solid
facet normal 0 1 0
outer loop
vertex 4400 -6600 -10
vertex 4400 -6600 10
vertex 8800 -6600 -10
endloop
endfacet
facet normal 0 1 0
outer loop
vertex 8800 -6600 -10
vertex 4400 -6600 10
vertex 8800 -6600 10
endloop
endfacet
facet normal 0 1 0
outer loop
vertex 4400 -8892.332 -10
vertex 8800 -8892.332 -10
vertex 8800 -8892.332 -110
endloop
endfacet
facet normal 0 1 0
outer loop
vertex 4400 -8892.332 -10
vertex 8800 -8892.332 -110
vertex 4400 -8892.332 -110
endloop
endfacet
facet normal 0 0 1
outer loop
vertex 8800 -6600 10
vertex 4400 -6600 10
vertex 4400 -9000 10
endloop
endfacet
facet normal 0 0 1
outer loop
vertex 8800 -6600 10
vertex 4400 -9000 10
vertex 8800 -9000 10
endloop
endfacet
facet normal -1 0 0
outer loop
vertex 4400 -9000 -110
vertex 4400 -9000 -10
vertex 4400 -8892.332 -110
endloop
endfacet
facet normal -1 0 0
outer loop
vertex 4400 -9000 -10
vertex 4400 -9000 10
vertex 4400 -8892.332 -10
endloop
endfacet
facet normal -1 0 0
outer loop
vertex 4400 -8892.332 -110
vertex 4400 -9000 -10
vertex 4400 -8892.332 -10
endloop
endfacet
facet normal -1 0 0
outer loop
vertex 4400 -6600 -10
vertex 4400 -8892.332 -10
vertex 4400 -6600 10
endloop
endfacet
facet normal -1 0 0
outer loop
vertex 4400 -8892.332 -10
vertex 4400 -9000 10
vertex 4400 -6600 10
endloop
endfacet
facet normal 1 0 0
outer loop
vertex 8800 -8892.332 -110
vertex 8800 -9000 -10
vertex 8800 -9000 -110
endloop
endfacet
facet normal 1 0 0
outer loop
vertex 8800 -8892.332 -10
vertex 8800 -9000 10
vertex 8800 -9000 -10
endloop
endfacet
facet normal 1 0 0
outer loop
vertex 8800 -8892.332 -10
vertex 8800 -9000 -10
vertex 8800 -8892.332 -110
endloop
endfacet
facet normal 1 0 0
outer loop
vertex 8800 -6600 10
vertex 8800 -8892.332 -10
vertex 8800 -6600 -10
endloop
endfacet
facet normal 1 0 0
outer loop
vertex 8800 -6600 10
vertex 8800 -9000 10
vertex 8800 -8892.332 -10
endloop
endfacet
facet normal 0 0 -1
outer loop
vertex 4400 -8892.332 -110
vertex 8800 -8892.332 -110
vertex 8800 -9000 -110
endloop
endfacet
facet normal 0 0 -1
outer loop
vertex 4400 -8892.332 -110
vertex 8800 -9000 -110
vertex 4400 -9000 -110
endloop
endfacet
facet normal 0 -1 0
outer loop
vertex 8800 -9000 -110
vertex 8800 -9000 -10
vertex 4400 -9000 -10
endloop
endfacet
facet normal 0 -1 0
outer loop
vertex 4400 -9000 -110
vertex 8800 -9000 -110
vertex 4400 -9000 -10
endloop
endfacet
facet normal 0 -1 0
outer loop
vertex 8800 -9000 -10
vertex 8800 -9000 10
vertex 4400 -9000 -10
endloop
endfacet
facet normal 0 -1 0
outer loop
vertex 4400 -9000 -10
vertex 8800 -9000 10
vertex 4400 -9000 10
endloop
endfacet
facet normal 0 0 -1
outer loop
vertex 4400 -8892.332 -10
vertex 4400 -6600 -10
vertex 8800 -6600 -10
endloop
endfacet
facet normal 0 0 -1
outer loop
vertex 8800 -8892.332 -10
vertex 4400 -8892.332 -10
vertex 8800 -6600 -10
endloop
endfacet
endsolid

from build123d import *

# Parameters (mm, degrees)
SKETCH_1_W      = 4400
SKETCH_1_H      = 2400
EXTRUDE_1_DEPTH = 10
SKETCH_2_W      = 4400
SKETCH_2_H      = 107.668061123
EXTRUDE_2_DEPTH = 100


with BuildPart() as part:
    # Эскиз1 → Бобышка-Вытянуть1 (new, symmetric)
    with BuildSketch(Plane.XY):
        with Locations((6600, -7800)):
            Rectangle(SKETCH_1_W, SKETCH_1_H)
    extrude(amount=EXTRUDE_1_DEPTH, both=True)

    # Эскиз2 → Бобышка-Вытянуть2 (add)
    with BuildSketch(Plane(origin=(0, 0, -10), x_dir=(-1, 0, 0), z_dir=(0, 0, -1))):
        with Locations((-6600, -8946.165969439)):
            Rectangle(SKETCH_2_W, SKETCH_2_H)
    extrude(amount=EXTRUDE_2_DEPTH)


solid = part.part
